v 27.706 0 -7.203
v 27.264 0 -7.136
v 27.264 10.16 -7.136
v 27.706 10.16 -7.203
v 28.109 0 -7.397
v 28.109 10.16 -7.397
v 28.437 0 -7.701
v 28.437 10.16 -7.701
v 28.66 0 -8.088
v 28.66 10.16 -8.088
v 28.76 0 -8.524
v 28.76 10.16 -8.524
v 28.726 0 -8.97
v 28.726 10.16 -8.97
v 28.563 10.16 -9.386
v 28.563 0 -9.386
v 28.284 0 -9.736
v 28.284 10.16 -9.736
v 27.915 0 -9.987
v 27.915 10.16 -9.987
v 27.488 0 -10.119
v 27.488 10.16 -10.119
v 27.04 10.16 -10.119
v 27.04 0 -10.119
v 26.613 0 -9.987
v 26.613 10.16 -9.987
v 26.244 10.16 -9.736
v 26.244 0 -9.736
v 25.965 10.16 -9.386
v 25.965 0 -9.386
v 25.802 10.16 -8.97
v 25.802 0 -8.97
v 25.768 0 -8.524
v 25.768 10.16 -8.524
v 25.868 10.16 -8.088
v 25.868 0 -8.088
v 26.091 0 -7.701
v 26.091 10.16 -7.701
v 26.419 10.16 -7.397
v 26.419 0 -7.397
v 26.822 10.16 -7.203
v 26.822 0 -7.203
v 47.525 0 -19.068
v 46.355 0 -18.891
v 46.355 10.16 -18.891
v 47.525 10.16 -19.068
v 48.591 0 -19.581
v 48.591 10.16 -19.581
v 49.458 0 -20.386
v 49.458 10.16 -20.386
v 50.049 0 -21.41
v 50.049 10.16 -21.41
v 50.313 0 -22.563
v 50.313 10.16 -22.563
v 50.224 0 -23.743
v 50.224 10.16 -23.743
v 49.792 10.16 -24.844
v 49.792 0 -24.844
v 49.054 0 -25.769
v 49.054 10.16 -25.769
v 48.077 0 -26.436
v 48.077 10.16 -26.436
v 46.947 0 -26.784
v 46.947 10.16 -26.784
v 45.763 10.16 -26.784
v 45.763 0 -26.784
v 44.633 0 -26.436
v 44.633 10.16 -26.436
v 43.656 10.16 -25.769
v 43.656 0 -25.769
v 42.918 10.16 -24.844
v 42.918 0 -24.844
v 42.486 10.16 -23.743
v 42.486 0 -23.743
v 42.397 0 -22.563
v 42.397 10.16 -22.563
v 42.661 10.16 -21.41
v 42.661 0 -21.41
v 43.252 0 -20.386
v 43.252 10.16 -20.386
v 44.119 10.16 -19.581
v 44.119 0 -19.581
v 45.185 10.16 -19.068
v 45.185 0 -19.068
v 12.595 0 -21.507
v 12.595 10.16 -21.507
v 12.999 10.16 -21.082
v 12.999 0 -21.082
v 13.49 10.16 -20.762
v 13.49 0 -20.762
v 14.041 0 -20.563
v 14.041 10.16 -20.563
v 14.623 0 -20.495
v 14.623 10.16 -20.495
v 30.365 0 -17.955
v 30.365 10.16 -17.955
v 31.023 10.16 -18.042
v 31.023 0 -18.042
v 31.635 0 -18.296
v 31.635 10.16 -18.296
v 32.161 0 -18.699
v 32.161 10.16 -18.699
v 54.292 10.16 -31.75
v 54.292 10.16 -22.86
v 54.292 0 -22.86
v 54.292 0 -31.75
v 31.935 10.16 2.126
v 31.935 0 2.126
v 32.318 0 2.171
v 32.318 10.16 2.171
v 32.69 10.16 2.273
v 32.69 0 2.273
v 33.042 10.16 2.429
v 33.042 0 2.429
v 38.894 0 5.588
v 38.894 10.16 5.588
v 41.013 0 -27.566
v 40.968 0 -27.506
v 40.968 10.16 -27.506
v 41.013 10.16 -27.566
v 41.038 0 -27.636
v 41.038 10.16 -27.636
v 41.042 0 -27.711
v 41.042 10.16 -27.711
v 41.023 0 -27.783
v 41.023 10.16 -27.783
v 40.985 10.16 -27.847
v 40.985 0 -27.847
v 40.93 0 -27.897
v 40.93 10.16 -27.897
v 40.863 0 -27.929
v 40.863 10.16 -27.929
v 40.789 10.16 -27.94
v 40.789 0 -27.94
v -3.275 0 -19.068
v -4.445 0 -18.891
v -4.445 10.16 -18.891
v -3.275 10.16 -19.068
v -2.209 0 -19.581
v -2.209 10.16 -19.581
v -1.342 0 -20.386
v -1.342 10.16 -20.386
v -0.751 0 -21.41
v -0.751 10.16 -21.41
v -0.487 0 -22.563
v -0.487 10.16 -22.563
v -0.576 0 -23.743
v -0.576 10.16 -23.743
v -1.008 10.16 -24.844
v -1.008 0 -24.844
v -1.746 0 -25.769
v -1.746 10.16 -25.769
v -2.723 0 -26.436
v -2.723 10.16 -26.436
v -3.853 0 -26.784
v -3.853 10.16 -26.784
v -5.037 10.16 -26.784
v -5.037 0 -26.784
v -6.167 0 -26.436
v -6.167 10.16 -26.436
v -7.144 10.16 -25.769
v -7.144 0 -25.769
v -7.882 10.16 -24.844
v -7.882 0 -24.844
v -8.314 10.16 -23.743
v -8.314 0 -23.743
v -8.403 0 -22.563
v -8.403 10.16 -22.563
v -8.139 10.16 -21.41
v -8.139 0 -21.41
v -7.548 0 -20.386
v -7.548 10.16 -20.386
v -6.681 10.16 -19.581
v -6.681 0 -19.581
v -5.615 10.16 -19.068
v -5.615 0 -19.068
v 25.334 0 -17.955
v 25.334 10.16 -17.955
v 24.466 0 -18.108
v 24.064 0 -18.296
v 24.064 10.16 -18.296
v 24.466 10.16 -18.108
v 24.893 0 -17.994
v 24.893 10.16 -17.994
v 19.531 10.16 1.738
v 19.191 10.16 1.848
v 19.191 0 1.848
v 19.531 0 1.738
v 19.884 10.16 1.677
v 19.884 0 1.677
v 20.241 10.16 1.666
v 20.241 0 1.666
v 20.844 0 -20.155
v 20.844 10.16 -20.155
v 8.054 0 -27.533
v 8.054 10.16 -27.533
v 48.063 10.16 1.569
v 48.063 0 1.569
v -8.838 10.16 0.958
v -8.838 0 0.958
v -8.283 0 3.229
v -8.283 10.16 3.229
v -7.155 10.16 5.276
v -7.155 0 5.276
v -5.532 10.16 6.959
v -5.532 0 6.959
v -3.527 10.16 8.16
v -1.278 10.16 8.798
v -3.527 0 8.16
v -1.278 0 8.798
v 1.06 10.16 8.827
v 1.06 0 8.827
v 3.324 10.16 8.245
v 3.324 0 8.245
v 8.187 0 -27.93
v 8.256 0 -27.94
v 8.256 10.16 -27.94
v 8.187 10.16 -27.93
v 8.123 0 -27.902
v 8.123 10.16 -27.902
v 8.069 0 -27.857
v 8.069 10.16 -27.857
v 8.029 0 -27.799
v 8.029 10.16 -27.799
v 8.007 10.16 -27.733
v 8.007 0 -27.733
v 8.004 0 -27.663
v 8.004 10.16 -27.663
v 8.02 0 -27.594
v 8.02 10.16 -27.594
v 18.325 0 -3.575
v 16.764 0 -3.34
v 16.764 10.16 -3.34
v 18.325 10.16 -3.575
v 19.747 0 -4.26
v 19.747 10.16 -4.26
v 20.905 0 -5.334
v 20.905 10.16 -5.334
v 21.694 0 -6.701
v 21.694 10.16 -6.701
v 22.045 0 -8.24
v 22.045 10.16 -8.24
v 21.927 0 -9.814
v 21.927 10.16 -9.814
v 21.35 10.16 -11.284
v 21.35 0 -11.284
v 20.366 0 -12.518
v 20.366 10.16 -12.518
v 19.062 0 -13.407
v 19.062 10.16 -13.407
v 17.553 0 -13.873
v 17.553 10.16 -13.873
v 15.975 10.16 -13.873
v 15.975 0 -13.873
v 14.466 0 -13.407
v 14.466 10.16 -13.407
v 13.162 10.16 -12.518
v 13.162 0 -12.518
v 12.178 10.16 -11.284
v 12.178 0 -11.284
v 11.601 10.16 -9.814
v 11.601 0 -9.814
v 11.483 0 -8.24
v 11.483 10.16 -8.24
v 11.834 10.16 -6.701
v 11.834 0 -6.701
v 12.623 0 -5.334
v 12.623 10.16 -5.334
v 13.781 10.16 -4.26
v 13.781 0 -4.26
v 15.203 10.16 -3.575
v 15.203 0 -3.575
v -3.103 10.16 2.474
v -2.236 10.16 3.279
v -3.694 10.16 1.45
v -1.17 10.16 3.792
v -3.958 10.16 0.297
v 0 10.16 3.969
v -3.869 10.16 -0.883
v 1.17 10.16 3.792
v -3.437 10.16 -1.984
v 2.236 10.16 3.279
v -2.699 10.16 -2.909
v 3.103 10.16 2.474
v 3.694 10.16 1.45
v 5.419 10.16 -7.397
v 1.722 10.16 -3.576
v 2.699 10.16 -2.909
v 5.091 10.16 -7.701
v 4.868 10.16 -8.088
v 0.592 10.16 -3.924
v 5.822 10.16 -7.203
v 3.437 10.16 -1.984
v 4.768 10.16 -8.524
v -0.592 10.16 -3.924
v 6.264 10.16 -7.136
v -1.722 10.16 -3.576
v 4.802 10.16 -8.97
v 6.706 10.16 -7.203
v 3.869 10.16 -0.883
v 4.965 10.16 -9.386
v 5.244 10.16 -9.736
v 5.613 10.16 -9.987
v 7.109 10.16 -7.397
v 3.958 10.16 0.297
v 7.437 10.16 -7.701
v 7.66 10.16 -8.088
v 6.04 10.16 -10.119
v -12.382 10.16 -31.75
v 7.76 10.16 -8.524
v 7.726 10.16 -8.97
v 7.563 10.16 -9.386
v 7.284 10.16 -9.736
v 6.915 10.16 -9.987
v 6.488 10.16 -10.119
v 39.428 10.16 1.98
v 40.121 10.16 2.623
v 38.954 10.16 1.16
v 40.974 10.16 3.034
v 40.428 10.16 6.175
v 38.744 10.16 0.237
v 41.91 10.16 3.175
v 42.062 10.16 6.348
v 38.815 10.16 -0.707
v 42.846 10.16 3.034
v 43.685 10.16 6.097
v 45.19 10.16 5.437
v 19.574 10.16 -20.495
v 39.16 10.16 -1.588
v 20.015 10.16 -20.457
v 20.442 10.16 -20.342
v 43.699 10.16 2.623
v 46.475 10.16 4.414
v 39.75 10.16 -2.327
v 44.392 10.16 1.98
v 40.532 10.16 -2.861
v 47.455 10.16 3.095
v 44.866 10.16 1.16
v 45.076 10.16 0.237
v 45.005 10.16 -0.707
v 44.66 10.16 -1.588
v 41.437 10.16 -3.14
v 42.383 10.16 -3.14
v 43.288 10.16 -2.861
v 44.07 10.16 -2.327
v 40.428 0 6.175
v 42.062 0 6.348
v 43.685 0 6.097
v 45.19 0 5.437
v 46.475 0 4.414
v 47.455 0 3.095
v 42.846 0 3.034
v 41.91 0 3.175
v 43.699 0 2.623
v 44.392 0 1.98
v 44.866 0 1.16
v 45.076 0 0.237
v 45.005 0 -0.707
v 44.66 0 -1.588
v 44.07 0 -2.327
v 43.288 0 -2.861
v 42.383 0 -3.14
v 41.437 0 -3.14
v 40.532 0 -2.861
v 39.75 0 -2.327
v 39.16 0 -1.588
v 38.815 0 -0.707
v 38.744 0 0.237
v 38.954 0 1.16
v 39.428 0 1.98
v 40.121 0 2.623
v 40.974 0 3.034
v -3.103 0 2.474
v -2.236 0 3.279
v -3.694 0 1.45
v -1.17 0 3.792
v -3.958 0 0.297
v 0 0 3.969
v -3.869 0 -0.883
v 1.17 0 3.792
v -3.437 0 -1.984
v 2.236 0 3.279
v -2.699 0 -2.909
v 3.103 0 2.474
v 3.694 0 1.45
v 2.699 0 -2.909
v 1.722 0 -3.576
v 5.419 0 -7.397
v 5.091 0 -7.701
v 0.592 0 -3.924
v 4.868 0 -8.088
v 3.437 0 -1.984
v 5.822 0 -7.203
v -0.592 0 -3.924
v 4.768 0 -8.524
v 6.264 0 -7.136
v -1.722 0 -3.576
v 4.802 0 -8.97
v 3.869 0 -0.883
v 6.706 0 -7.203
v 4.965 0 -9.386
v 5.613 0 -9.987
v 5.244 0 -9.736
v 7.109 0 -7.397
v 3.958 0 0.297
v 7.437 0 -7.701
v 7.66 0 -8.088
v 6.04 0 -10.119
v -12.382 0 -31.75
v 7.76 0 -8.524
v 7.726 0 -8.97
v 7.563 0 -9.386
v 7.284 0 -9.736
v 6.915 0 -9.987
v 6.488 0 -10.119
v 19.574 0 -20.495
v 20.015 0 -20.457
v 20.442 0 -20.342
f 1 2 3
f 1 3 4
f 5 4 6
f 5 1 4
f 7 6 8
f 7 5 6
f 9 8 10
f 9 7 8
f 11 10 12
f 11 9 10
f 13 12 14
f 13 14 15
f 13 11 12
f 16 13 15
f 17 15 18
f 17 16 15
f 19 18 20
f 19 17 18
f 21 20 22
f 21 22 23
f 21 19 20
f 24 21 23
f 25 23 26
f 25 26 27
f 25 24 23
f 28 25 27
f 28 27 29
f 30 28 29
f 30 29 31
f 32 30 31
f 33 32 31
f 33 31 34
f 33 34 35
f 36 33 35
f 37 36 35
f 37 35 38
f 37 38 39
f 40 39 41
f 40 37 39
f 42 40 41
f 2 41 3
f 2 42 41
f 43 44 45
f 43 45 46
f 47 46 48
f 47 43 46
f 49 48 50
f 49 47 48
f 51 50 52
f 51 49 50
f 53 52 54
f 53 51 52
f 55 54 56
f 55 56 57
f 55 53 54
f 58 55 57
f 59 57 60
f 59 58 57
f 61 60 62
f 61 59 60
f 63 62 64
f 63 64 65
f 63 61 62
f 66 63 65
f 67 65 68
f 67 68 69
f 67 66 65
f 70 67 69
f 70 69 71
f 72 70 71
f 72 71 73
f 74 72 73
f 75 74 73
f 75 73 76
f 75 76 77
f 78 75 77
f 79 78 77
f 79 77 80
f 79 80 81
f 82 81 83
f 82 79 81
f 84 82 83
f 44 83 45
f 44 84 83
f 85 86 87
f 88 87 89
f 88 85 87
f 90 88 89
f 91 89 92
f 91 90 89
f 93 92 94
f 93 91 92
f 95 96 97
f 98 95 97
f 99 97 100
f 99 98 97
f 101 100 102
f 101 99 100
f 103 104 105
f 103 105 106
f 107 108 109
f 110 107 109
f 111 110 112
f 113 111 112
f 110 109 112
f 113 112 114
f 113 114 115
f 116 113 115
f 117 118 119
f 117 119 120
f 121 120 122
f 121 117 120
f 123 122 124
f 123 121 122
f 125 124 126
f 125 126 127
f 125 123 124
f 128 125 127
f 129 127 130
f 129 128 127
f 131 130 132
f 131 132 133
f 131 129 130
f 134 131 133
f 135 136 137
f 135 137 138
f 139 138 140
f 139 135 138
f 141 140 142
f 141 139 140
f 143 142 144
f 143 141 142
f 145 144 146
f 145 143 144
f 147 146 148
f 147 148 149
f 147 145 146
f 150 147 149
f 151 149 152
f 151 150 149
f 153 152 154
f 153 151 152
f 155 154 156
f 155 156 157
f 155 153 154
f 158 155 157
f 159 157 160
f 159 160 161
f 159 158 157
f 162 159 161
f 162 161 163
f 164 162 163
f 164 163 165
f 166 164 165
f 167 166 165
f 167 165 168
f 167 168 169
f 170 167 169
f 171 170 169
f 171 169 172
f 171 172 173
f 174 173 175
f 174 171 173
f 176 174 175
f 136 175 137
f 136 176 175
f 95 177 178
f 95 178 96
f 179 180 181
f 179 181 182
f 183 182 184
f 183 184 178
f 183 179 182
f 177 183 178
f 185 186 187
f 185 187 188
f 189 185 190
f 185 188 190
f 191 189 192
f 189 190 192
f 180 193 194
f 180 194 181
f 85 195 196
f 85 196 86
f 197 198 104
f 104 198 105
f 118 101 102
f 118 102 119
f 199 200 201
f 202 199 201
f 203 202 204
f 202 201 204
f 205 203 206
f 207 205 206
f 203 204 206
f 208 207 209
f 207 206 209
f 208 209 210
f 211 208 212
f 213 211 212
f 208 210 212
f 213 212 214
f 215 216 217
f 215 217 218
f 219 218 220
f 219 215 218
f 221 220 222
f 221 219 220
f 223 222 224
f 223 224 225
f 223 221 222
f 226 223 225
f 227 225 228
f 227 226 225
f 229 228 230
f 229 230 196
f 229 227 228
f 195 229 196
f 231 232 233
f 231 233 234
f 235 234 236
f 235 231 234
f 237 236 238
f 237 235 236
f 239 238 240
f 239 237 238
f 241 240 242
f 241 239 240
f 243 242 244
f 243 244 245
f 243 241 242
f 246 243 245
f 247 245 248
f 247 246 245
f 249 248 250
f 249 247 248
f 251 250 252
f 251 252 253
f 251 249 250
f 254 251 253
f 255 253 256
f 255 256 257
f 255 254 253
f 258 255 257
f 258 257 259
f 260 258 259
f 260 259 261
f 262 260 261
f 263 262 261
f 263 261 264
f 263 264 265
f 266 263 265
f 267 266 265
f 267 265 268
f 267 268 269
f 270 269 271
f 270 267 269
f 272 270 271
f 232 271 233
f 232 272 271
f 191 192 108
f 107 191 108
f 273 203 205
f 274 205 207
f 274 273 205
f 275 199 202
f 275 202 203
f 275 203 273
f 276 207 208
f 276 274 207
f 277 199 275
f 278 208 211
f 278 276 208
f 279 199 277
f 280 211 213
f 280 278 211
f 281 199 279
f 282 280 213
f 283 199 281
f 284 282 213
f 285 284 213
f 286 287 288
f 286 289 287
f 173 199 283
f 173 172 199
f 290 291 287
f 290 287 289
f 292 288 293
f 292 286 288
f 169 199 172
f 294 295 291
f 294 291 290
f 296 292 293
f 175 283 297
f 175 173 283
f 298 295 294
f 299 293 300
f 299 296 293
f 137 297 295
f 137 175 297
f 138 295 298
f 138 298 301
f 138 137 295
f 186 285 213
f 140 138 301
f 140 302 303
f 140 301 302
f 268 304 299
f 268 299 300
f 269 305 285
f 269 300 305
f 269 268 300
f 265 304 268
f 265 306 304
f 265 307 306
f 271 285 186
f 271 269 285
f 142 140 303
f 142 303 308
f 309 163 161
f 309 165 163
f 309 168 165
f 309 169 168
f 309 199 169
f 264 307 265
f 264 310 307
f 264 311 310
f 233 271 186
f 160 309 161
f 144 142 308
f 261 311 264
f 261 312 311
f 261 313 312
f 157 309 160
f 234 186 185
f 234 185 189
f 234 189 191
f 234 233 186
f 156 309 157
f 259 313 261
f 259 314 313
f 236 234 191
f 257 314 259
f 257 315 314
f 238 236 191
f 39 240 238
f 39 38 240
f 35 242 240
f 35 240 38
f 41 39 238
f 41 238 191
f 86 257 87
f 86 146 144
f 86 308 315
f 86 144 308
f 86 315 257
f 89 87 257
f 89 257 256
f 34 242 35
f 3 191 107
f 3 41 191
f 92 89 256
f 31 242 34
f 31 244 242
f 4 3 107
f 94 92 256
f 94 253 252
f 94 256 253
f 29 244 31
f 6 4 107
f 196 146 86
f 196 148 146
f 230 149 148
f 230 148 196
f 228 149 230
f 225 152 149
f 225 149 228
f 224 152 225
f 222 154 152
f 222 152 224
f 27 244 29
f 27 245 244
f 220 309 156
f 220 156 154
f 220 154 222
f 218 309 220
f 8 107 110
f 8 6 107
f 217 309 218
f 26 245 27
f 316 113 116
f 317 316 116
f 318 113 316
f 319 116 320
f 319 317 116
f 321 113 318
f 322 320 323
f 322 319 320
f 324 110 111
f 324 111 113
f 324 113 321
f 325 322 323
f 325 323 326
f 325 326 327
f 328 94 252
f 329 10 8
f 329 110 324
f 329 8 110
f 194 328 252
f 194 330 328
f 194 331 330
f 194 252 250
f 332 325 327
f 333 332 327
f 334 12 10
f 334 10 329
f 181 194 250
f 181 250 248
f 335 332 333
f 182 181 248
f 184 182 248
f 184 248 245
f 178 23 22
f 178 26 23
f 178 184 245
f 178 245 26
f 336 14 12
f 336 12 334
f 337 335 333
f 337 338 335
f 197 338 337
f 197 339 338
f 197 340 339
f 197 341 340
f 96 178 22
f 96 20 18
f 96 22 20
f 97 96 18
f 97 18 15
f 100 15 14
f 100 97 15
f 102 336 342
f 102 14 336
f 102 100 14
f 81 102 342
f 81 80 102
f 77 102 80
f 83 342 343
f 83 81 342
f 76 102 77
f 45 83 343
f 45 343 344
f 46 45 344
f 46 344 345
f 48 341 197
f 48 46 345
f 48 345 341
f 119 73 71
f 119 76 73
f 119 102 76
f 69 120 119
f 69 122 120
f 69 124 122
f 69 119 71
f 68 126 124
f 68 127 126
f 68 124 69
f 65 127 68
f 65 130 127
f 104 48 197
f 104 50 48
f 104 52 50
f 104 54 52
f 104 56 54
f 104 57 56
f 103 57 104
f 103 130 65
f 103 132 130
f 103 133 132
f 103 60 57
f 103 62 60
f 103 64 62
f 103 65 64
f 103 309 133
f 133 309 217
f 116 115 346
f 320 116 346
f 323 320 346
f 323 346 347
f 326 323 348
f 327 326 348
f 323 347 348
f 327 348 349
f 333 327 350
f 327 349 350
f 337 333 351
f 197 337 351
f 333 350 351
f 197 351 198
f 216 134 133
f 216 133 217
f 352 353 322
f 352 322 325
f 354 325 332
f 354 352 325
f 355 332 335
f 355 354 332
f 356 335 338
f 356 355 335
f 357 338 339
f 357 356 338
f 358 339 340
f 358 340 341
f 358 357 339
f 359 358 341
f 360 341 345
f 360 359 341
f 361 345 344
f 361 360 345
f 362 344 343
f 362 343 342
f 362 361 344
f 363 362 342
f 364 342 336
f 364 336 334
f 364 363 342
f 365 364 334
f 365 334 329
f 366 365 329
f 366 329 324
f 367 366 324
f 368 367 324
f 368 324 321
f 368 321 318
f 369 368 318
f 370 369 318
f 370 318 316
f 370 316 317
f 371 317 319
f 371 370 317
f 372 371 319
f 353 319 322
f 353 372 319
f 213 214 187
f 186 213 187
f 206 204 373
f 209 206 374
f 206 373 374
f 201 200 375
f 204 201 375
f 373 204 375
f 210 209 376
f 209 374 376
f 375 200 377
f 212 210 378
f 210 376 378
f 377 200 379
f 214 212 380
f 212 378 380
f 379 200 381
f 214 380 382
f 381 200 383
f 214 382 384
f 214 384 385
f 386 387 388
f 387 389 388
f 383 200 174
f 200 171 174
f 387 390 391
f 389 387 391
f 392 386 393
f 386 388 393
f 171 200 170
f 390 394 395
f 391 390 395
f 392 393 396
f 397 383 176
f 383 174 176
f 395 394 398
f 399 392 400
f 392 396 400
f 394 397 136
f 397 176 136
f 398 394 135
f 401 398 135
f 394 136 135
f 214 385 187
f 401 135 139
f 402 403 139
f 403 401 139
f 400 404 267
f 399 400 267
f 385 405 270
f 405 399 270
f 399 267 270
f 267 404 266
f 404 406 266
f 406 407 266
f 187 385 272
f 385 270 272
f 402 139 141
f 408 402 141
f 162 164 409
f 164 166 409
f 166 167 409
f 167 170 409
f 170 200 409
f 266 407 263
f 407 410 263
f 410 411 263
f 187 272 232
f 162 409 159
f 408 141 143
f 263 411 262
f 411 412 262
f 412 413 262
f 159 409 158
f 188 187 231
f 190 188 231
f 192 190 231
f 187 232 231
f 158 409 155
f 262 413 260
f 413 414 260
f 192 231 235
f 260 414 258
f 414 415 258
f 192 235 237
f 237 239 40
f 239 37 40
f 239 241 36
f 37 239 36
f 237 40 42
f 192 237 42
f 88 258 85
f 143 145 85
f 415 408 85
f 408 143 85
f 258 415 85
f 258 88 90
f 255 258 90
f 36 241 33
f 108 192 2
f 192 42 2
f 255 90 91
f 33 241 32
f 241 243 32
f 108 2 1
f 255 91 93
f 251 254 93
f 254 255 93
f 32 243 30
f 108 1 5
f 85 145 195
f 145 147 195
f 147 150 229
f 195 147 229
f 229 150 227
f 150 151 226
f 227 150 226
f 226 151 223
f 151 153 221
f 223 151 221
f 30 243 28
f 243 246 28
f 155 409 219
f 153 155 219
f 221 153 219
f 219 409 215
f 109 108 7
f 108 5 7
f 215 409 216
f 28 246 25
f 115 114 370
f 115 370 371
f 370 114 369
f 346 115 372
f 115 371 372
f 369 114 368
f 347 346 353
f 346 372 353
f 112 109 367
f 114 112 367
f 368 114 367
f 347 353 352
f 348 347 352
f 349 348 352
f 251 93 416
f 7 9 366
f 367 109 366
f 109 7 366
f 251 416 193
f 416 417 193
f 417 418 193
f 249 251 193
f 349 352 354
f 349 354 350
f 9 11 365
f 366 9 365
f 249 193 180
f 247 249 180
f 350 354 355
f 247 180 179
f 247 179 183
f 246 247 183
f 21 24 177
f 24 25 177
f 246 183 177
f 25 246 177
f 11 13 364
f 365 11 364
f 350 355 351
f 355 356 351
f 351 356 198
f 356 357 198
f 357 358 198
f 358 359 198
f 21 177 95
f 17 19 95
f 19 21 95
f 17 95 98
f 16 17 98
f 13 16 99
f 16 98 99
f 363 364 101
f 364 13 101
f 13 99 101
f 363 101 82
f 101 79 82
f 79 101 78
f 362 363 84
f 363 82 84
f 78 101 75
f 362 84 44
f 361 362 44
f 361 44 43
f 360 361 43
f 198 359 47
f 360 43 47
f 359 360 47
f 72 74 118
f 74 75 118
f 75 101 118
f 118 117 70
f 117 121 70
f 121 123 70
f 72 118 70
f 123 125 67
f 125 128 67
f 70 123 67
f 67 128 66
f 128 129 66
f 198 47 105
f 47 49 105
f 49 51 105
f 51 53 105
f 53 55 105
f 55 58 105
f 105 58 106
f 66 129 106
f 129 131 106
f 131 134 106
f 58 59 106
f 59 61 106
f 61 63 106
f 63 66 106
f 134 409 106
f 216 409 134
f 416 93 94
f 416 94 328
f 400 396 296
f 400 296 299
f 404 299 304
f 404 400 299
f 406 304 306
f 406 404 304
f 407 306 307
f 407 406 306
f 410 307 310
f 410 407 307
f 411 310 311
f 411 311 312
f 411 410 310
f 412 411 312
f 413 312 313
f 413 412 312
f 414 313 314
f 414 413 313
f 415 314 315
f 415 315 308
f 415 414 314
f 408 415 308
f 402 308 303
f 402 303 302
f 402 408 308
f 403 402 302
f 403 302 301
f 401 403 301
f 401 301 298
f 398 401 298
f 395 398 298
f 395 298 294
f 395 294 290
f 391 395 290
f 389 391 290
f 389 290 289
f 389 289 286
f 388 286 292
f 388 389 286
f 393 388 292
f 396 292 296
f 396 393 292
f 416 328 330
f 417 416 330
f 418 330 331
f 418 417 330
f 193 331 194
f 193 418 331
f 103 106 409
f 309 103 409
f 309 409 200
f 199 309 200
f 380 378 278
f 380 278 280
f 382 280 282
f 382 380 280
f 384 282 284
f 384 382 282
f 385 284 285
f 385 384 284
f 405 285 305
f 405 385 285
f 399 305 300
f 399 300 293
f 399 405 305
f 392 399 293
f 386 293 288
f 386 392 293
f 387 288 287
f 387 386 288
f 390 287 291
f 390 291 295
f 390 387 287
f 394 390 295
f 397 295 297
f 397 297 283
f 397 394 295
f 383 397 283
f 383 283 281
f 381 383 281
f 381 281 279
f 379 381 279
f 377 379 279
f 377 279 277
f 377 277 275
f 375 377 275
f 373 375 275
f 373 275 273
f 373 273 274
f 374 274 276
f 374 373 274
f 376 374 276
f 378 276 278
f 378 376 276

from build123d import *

# Parameters (mm, degrees)
SKETCH4_R           = 3.96875
SKETCH4_R_2         = 5.2959
SKETCH4_R_3         = 1.5
SKETCH4_R_4         = 3.175
BOSS_EXTRUDE2_DEPTH = 10.16


with BuildPart() as part:
    # Sketch4 → Boss-Extrude2 (new body)
    with BuildSketch(Plane(origin=(0, 0, 0), x_dir=(1, 0, 0), z_dir=(0, 1, 0))):
        with BuildLine():
            Line((54.2925, 31.75), (-12.3825, 31.75))
            Line((-12.3825, 31.75), (-8.838261623, -0.957722033))
            ThreePointArc((-8.838261623, -0.957722033), (-4.569283935, -7.625860235), (3.324048375, -8.245168428))
            Line((3.324048375, -8.245168428), (19.191308787, -1.848265606))
            ThreePointArc((19.191308787, -1.848265606), (19.706480828, -1.70147711), (20.240980706, -1.665995068))
            Line((20.240980706, -1.665995068), (31.935252388, -2.1264974))
            ThreePointArc((31.935252388, -2.1264974), (32.505817446, -2.214628745), (33.041741732, -2.429330346))
            Line((33.041741732, -2.429330346), (38.89391711, -5.588))
            ThreePointArc((38.89391711, -5.588), (44.459162112, -5.815863868), (48.063098072, -1.569039233))
            Line((48.063098072, -1.569039233), (54.2925, 22.86))
            Line((54.2925, 22.86), (54.2925, 31.75))
        make_face()
        with Locations(Location((0, 0, 0), (0, 0, 270))):
            Circle(SKETCH4_R, mode=Mode.SUBTRACT)
        with Locations(Location((46.355, 22.86, 0), (0, 0, 270))):
            Circle(SKETCH4_R, mode=Mode.SUBTRACT)
        with Locations(Location((-4.445, 22.86, 0), (0, 0, 270))):
            Circle(SKETCH4_R, mode=Mode.SUBTRACT)
        with Locations(Location((16.764, 8.636, 0), (0, 0, 270))):
            Circle(SKETCH4_R_2, mode=Mode.SUBTRACT)
        with Locations(Location((27.264, 8.636, 0), (0, 0, 270))):
            Circle(SKETCH4_R_3, mode=Mode.SUBTRACT)
        with Locations(Location((6.264, 8.636, 0), (0, 0, 270))):
            Circle(SKETCH4_R_3, mode=Mode.SUBTRACT)
        with Locations(Location((41.91, 0, 0), (0, 0, 270))):
            Circle(SKETCH4_R_4, mode=Mode.SUBTRACT)
        with BuildLine():
            Line((40.788789755, 27.94), (8.256445186, 27.94))
            ThreePointArc((8.256445186, 27.94), (8.029131858, 27.799334245), (8.053591766, 27.533138984))
            Line((8.053591766, 27.533138984), (12.594862372, 21.506669344))
            ThreePointArc((12.594862372, 21.506669344), (13.490054122, 20.762146224), (14.623396567, 20.495279502))
            Line((14.623396567, 20.495279502), (19.573752381, 20.495279502))
            ThreePointArc((19.573752381, 20.495279502), (20.231152756, 20.408731101), (20.843752381, 20.154984028))
            Line((20.843752381, 20.154984028), (24.06434333, 18.295574977))
            ThreePointArc((24.06434333, 18.295574977), (24.676942955, 18.041827904), (25.33434333, 17.955279502))
            Line((25.33434333, 17.955279502), (30.365177054, 17.955279502))
            ThreePointArc((30.365177054, 17.955279502), (31.337192972, 18.14862549), (32.161228278, 18.699228278))
            Line((32.161228278, 18.699228278), (40.968394878, 27.506394878))
            ThreePointArc((40.968394878, 27.506394878), (41.023455156, 27.783201592), (40.788789755, 27.94))
        make_face(mode=Mode.SUBTRACT)
    extrude(amount=BOSS_EXTRUDE2_DEPTH)


solid = part.part
